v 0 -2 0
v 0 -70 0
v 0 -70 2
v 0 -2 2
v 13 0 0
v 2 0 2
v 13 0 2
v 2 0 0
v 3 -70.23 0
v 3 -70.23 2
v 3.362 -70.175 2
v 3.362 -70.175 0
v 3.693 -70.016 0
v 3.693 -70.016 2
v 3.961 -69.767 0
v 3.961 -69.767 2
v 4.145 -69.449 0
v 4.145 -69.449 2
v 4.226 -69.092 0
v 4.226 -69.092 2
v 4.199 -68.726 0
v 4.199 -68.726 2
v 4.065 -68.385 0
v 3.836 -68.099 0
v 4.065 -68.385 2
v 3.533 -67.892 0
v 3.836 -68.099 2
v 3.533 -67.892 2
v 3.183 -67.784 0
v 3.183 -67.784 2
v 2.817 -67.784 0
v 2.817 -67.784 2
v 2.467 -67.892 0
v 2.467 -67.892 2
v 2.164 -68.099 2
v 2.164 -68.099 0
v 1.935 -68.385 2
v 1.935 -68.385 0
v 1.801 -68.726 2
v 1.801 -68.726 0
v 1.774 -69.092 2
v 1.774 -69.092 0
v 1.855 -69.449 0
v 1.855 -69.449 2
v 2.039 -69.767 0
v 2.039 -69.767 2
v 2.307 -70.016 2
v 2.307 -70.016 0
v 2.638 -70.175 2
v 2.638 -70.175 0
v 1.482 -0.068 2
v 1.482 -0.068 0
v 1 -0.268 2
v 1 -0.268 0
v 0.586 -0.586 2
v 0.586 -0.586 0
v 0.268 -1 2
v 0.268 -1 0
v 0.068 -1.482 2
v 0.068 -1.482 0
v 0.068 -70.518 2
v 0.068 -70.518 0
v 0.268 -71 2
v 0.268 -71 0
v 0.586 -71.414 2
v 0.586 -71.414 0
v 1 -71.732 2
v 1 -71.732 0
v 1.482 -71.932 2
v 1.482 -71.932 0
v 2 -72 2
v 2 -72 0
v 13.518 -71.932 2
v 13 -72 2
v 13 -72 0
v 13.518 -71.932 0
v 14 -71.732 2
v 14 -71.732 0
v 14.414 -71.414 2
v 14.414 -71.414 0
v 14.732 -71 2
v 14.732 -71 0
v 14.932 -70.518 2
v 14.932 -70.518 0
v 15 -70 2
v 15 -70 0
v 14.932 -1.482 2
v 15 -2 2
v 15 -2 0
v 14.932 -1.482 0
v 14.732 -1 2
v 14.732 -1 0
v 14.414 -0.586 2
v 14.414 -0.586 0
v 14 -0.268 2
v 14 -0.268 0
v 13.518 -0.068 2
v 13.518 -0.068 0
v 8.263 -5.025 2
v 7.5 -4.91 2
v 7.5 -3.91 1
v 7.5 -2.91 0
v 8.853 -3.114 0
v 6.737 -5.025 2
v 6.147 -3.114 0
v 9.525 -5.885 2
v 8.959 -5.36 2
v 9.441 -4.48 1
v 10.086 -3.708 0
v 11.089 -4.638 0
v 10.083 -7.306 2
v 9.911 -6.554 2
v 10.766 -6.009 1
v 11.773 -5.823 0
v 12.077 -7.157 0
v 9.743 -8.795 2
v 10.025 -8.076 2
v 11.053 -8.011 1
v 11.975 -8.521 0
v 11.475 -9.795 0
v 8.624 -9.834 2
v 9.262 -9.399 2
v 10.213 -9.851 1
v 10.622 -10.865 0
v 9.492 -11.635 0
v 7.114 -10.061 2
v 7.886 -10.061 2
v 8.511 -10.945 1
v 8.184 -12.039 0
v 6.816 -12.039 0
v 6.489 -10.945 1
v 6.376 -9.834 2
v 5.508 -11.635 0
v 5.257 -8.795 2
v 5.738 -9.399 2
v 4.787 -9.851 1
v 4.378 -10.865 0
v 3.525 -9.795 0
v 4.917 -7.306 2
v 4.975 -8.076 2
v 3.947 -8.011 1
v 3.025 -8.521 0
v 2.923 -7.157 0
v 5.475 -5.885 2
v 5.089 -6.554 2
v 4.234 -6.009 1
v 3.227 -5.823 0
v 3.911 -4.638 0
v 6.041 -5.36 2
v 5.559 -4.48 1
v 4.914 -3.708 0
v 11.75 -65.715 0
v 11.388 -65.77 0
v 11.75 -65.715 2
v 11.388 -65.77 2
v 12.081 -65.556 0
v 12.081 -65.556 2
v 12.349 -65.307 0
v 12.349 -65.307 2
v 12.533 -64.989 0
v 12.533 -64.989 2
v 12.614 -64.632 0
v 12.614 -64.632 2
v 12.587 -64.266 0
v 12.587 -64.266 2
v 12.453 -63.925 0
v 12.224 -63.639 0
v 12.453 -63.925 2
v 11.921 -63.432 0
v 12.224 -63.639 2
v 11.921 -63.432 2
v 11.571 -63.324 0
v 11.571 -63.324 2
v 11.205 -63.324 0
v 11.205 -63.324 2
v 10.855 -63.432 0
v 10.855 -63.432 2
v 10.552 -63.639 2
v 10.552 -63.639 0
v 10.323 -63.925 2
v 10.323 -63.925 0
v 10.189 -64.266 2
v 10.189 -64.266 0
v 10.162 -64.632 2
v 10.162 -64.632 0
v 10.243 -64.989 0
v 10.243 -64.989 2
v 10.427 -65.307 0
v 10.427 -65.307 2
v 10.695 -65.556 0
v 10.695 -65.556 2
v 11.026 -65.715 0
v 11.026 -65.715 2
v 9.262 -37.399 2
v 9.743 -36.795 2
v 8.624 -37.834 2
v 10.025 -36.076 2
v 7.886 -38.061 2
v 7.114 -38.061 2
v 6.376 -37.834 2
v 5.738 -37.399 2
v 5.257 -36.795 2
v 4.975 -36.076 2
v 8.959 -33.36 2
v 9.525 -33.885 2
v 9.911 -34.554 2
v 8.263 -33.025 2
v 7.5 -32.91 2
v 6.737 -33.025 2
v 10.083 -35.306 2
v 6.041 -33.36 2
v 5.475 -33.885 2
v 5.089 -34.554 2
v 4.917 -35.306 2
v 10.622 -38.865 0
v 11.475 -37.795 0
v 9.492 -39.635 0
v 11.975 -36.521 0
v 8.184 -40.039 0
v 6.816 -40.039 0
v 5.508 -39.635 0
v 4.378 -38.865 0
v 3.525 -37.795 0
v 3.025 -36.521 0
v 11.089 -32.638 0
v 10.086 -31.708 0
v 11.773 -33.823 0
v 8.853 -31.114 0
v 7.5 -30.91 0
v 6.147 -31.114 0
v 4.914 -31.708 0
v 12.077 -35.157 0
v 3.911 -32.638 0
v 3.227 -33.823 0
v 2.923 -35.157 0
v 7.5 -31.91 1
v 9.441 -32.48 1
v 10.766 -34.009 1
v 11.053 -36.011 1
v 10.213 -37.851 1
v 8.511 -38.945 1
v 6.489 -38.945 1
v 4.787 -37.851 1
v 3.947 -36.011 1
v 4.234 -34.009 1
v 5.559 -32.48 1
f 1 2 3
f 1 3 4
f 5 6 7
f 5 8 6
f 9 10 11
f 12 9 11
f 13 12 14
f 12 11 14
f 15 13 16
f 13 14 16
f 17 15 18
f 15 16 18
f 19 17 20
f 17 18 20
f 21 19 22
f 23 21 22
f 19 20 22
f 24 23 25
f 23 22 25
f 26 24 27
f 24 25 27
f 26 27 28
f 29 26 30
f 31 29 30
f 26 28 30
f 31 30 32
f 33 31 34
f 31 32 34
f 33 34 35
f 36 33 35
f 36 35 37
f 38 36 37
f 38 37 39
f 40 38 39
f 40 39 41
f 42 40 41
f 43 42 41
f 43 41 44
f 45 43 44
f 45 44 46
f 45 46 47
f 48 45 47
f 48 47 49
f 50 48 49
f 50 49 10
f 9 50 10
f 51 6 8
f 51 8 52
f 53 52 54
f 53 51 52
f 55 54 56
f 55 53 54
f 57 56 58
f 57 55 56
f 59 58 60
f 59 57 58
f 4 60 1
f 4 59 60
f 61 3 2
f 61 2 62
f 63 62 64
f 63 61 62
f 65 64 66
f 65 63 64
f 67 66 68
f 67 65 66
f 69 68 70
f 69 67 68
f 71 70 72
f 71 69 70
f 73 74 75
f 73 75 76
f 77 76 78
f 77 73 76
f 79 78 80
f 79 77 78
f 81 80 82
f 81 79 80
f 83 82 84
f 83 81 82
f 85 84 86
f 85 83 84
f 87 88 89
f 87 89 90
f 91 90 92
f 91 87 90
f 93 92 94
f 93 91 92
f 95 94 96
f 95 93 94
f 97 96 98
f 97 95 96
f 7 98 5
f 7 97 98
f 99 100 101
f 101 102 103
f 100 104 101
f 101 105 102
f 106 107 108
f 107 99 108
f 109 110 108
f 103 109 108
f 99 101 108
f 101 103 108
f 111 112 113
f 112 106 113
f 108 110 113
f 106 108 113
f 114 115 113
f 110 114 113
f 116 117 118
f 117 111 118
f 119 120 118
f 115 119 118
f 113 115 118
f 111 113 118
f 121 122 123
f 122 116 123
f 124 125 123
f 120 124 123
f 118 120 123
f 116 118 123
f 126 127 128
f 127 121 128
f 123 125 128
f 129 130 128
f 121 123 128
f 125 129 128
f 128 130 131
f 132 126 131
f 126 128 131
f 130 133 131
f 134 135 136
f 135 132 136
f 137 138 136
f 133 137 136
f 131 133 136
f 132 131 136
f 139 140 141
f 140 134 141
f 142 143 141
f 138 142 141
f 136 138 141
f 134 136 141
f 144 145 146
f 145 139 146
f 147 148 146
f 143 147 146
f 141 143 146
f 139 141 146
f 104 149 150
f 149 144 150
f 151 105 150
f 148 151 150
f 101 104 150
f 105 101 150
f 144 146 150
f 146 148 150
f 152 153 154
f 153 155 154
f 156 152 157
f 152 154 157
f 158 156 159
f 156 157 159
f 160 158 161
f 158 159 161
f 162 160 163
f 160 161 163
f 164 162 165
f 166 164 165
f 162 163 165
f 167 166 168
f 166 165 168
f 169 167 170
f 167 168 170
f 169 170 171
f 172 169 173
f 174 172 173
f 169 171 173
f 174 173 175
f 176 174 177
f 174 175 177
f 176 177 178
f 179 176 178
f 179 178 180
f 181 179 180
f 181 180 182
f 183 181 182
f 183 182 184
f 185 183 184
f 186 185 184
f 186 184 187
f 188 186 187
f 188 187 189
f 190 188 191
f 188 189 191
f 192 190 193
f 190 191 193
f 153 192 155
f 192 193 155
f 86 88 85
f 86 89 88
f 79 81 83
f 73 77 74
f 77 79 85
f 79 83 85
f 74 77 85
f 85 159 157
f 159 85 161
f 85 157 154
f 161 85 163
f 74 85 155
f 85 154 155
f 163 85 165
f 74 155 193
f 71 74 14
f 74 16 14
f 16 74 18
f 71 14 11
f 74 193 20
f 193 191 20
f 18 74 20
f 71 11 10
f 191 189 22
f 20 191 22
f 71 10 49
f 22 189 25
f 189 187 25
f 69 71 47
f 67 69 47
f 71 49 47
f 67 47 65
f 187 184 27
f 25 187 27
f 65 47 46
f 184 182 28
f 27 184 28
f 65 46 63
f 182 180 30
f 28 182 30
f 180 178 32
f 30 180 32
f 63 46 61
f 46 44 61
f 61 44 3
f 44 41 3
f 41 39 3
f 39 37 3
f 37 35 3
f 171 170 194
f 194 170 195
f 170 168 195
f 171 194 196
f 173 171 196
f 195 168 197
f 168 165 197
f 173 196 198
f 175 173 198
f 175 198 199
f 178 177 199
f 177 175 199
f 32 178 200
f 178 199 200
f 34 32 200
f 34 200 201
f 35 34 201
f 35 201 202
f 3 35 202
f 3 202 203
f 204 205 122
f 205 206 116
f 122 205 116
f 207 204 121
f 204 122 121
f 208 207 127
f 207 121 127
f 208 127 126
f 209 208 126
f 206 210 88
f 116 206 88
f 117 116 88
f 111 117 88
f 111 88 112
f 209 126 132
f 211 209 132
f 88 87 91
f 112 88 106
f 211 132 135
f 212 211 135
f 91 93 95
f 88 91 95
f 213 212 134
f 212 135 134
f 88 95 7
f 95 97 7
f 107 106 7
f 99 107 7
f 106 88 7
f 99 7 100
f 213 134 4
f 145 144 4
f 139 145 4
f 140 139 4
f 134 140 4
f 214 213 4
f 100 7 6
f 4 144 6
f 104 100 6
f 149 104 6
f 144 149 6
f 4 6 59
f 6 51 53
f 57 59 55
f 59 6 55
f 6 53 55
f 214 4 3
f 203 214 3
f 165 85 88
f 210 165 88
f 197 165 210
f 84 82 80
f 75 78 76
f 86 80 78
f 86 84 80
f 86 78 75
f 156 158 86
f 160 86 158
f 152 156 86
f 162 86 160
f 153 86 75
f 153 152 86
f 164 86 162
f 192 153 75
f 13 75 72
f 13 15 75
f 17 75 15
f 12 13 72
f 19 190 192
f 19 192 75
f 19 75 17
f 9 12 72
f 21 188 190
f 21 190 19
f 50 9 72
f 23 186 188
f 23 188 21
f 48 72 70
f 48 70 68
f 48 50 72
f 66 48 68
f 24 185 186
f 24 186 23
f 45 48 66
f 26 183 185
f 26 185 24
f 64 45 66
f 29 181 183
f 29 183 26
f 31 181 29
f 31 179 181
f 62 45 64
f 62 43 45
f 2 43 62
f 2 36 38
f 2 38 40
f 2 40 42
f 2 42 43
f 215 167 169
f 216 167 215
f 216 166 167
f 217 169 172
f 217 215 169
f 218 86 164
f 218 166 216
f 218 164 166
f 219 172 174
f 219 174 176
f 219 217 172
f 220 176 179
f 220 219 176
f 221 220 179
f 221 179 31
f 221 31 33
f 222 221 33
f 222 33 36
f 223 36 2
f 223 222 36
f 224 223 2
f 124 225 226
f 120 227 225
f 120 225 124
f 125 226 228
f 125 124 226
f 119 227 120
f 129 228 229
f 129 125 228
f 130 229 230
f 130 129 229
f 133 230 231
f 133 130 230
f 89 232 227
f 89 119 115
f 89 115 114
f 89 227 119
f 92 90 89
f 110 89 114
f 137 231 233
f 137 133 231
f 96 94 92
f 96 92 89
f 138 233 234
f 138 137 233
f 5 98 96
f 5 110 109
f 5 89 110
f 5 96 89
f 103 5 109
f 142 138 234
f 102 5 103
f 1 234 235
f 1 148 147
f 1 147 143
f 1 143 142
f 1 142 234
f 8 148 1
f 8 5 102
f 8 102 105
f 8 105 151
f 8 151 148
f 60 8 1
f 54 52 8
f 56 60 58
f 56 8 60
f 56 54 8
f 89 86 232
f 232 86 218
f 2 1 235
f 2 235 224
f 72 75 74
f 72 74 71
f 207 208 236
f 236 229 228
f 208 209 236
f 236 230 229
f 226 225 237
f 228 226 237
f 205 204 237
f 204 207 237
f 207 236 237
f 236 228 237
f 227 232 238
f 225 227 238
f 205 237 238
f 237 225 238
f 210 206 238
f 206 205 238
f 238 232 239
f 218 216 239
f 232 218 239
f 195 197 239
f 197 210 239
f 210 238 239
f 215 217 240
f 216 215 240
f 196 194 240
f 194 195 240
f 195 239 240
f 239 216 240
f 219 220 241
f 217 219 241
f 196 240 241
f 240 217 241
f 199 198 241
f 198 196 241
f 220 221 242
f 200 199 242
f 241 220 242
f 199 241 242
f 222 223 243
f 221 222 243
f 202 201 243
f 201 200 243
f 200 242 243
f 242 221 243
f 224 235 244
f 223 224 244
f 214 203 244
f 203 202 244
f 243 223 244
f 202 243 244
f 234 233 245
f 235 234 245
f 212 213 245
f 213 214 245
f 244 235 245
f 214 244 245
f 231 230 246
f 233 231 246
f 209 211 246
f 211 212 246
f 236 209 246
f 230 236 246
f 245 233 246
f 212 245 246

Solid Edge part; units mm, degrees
sketch "Sketch1" plane through (0, 0, 0) normal (0, 0, 1) x (1, 0, 0)
  line L0 (15, -72) -> (0, -72)
  line L1 (0, -72) -> (0, 0)
  line L2 (0, 0) -> (15, 0)
  line L3 (15, 0) -> (15, -72)
extrude "Protrusion1" add sketch "Sketch1" along normal blind 2
hole "Bohrung_1" at (3, -69, 2) direction (0, 0, -1) diameter 2.459 end through all
hole "Hole1" at (11.388, -64.54, 2) direction (0, 0, -1) diameter 2.459 end through all
fillet "Verrundung_1" radius 2 4 edges at (15, 0, 1) (0, 0, 1) (15, -72, 1) (0, -72, 1)
hole "Bohrung_5" at (7.5, -35.5, 0) direction (0, 0, 1) diameter 4.3 end through all countersink diameter 9.18 countersink angle 90
hole "Hole2" at (7.5, -7.5, 0) direction (0, 0, 1) diameter 4.3 end through all countersink diameter 9.18 countersink angle 90
